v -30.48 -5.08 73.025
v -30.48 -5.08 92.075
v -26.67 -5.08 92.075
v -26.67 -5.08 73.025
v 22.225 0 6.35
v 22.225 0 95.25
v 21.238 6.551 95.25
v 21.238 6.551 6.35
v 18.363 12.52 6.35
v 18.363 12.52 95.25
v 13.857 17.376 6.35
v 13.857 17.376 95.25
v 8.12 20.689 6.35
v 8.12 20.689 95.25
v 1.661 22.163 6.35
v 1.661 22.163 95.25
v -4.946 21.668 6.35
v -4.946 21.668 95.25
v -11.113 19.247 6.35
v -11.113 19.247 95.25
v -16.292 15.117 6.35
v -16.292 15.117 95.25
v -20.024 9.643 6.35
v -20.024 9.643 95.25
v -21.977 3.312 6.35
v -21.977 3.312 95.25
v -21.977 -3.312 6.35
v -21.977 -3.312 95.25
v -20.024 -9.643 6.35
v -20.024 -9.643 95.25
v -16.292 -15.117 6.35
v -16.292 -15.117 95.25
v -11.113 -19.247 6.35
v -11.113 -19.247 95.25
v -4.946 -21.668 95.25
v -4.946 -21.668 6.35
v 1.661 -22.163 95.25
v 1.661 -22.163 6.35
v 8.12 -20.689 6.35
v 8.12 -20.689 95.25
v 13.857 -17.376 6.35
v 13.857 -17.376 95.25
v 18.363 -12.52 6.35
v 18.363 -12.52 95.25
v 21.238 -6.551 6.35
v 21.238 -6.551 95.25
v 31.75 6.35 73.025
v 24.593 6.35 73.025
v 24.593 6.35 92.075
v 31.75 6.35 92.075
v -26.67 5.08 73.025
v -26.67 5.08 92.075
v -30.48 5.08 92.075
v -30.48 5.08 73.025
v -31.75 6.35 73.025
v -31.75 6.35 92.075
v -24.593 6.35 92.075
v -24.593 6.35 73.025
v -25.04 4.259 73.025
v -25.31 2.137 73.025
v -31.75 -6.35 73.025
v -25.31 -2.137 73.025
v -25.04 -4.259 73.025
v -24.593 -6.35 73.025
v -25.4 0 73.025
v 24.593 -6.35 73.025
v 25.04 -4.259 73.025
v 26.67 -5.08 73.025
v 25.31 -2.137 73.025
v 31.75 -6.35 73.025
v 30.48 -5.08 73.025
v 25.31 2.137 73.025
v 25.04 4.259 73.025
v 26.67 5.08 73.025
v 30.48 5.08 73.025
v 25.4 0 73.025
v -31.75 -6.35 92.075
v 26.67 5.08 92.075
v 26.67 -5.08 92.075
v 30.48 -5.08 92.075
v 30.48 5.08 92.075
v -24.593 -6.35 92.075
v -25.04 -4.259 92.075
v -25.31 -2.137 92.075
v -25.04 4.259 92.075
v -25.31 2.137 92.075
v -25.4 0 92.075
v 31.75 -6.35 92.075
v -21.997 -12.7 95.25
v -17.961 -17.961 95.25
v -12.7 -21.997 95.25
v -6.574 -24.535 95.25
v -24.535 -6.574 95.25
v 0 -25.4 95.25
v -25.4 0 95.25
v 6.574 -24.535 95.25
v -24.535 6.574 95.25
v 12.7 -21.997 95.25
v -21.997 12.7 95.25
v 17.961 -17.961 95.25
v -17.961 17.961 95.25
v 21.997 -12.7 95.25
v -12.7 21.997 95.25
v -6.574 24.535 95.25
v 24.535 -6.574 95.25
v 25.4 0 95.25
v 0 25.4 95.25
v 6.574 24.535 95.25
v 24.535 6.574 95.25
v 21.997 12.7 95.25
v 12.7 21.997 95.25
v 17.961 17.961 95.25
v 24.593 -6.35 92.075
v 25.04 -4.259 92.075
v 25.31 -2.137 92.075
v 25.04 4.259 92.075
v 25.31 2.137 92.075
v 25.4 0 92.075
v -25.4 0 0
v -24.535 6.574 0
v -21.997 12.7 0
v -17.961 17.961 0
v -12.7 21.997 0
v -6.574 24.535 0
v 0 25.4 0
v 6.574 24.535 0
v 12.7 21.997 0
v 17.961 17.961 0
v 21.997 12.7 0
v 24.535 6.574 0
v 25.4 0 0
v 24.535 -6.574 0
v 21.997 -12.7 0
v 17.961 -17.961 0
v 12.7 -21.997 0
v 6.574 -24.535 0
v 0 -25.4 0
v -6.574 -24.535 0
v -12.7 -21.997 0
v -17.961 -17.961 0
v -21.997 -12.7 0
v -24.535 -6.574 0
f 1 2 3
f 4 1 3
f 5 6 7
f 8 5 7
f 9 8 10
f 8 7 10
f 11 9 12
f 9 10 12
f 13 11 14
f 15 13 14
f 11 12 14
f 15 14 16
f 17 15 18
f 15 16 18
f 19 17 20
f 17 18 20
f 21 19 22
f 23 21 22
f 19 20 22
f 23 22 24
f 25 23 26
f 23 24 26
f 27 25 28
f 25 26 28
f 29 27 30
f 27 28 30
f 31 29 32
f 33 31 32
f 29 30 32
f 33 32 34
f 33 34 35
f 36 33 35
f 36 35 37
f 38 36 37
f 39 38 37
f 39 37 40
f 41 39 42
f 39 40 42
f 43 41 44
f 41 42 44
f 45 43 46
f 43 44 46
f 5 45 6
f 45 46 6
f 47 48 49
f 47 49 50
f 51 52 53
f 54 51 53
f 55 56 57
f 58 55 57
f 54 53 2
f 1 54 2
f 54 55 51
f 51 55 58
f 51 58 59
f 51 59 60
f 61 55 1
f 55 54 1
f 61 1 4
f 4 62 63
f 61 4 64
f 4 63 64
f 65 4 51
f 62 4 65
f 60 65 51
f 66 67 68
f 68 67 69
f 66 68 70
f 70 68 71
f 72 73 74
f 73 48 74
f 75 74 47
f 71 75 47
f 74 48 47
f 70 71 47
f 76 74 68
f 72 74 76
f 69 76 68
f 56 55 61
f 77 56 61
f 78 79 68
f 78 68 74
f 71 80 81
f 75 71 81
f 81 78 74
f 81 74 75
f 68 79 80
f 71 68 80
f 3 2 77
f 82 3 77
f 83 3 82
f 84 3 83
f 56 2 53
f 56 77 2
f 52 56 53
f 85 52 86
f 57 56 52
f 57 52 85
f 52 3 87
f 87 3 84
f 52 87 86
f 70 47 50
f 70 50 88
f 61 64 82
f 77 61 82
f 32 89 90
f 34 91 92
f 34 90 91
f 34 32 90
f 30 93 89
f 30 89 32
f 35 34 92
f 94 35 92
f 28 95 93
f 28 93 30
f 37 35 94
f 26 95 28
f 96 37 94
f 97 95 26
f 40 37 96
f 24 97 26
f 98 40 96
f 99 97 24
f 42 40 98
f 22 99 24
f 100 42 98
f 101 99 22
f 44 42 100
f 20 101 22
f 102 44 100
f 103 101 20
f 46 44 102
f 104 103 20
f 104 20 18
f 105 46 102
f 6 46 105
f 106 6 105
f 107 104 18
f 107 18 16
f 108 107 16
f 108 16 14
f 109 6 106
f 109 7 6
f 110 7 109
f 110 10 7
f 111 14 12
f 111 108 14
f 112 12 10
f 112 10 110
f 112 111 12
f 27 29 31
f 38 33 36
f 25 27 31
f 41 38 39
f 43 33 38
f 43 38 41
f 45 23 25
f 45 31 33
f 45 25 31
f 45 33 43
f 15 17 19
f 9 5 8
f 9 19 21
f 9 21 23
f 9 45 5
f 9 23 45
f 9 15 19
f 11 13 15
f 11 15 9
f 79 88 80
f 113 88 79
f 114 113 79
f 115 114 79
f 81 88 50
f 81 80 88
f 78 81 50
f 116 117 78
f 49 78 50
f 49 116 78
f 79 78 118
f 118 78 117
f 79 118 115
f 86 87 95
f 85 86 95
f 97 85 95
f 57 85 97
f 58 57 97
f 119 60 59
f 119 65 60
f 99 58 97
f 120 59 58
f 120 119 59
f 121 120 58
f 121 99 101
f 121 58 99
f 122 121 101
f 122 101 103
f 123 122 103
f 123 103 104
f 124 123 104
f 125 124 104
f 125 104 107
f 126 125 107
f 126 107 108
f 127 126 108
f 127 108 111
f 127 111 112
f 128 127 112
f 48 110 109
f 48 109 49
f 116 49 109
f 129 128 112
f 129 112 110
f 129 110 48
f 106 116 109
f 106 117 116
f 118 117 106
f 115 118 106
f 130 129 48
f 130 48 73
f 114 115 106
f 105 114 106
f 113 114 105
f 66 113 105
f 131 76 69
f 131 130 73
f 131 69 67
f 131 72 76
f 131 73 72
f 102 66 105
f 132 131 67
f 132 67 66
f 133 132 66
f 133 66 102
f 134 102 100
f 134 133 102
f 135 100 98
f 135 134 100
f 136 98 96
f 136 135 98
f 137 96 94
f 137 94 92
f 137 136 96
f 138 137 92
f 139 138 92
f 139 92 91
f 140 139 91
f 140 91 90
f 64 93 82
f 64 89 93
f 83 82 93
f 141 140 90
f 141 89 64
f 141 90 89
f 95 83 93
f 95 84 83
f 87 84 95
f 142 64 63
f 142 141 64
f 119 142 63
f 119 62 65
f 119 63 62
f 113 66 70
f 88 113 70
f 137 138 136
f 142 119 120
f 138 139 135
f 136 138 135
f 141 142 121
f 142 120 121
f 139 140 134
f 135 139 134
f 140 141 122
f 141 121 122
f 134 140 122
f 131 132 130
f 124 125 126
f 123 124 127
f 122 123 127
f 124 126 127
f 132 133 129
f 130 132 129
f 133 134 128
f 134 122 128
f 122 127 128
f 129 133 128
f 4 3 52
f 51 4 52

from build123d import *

# Parameters (mm, degrees)
F0_W          = 50.8
F0_H          = 50.8
F1_DEPTH      = 95.25
F3_DEPTH      = 6.35
F5_W          = 3.81
F5_H          = 10.16
F6_DEPTH      = 25.4
F7_T4_DEPTH   = 222.25
F7_T10_DEPTH  = 222.25
F7_T16_DEPTH  = 222.25
F7_T23_DEPTH  = 222.25
F7_T29_DEPTH  = 222.25
F7_T35_DEPTH  = 222.25
F7_T41_DEPTH  = 222.25
F7_T47_DEPTH  = 222.25
F7_T54_DEPTH  = 222.25
F7_T60_DEPTH  = 222.25
F7_T66_DEPTH  = 222.25
F7_T72_DEPTH  = 222.25
F7_T78_DEPTH  = 222.25
F7_T85_DEPTH  = 222.25
F7_T91_DEPTH  = 222.25
F7_T97_DEPTH  = 222.25
F7_T103_DEPTH = 222.25
F7_T109_DEPTH = 222.25
F7_T116_DEPTH = 222.25
F7_T122_DEPTH = 222.25
F8_R          = 22.225
F9_DEPTH      = 88.9


# Not quite as in the source:
# - a fillet or chamfer that OpenCascade refuses, or shapes differently, is made with other operations: its cross-section is extruded or revolved along the edge and cut away or added


with BuildPart() as f1:
    # F0 (on Top) → F1 (new body)
    with BuildSketch(Plane.XY):
        Rectangle(F0_W, F0_H)
    extrude(amount=F1_DEPTH)

    # F2 (on face) → F3 (join)
    with BuildSketch(Plane(origin=(-25.4, 0, 0), x_dir=(0, -1, 0), z_dir=(-1, 0, 0))):
        Polygon((-6.35, 73.025), (6.35, 73.025), (6.35, 92.075), (0, 92.075), (-6.35, 92.075), align=None)
    extrude(amount=F3_DEPTH)

    # F4: F1 across plane


with BuildPart() as f1_1:
    add(f1.part)
    add(f1.part.mirror(Plane.YZ))

    # F5 (on face) → F6 (cut)
    with BuildSketch(Plane.XY.offset(95.25)):
        Polygon((-26.67, -5.08), (-26.67, 0), (-28.575, 0), (-30.48, 0), (-30.48, -5.08), align=None)
        Polygon((-28.575, 0), (-26.67, 0), (-26.67, 5.08), (-30.48, 5.08), (-30.48, 0), align=None)
        with Locations((28.575, 0)):
            Rectangle(F5_W, F5_H)
    extrude(amount=-F6_DEPTH, mode=Mode.SUBTRACT)

    # F7: fillet of radius 25.4 on 4 edges, made by hand


with BuildPart() as f7_tool2:
    # F7_s3 → F7_t4 (new body)
    with BuildSketch(Plane.XY.offset(-63.5)):
        with BuildLine():
            ThreePointArc((0, -25.4), (-17.9605122421, -17.9605122421), (-25.4, 0))
            Line((-25.4, 0), (-25.4, -25.4))
            Line((-25.4, -25.4), (0, -25.4))
        make_face()
    extrude(amount=F7_T4_DEPTH)

    split(bisect_by=Plane.XZ.offset(6.35), keep=Keep.TOP)

    split(bisect_by=Plane.XY.offset(73.025), keep=Keep.BOTTOM)


with BuildPart() as f1_2:
    add(f1_1.part)

    # F7_t1: cut F7_tool2
    add(f7_tool2.part, mode=Mode.SUBTRACT)


with BuildPart() as f7_tool8:
    # F7_s9 → F7_t10 (new body)
    with BuildSketch(Plane.XY.offset(-63.5)):
        with BuildLine():
            ThreePointArc((0, -25.4), (-17.9605122421, -17.9605122421), (-25.4, 0))
            Line((-25.4, 0), (-25.4, -25.4))
            Line((-25.4, -25.4), (0, -25.4))
        make_face()
    extrude(amount=F7_T10_DEPTH)

    split(bisect_by=Plane.XZ.offset(6.35), keep=Keep.BOTTOM)

    split(bisect_by=Plane.XY.offset(73.025), keep=Keep.BOTTOM)


with BuildPart() as f1_3:
    add(f1_2.part)

    # F7_t7: cut F7_tool8
    add(f7_tool8.part, mode=Mode.SUBTRACT)


with BuildPart() as f7_tool14:
    # F7_s15 → F7_t16 (new body)
    with BuildSketch(Plane.XY.offset(-63.5)):
        with BuildLine():
            ThreePointArc((0, -25.4), (-17.9605122421, -17.9605122421), (-25.4, 0))
            Line((-25.4, 0), (-25.4, -25.4))
            Line((-25.4, -25.4), (0, -25.4))
        make_face()
    extrude(amount=F7_T16_DEPTH)

    split(bisect_by=Plane.XY.offset(92.075), keep=Keep.BOTTOM)

    split(bisect_by=Plane.XZ.offset(6.35), keep=Keep.TOP)

    split(bisect_by=Plane.XY.offset(73.025), keep=Keep.TOP)


with BuildPart() as f1_4:
    add(f1_3.part)

    # F7_t13: cut F7_tool14
    add(f7_tool14.part, mode=Mode.SUBTRACT)


with BuildPart() as f7_tool21:
    # F7_s22 → F7_t23 (new body)
    with BuildSketch(Plane.XY.offset(-63.5)):
        with BuildLine():
            ThreePointArc((0, -25.4), (-17.9605122421, -17.9605122421), (-25.4, 0))
            Line((-25.4, 0), (-25.4, -25.4))
            Line((-25.4, -25.4), (0, -25.4))
        make_face()
    extrude(amount=F7_T23_DEPTH)

    split(bisect_by=Plane.XY.offset(92.075), keep=Keep.TOP)

    split(bisect_by=Plane.XZ.offset(6.35), keep=Keep.TOP)


with BuildPart() as f1_5:
    add(f1_4.part)

    # F7_t20: cut F7_tool21
    add(f7_tool21.part, mode=Mode.SUBTRACT)


with BuildPart() as f7_tool27:
    # F7_s28 → F7_t29 (new body)
    with BuildSketch(Plane.XY.offset(-63.5)):
        with BuildLine():
            ThreePointArc((0, -25.4), (-17.9605122421, -17.9605122421), (-25.4, 0))
            Line((-25.4, 0), (-25.4, -25.4))
            Line((-25.4, -25.4), (0, -25.4))
        make_face()
    extrude(amount=F7_T29_DEPTH)

    split(bisect_by=Plane.XY.offset(92.075), keep=Keep.TOP)

    split(bisect_by=Plane.XZ.offset(6.35), keep=Keep.BOTTOM)


with BuildPart() as f1_6:
    add(f1_5.part)

    # F7_t26: cut F7_tool27
    add(f7_tool27.part, mode=Mode.SUBTRACT)


with BuildPart() as f7_tool33:
    # F7_s34 → F7_t35 (new body)
    with BuildSketch(Plane.XY.offset(-63.5)):
        with BuildLine():
            ThreePointArc((0, -25.4), (17.9605122421, -17.9605122421), (25.4, 0))
            Line((25.4, 0), (25.4, -25.4))
            Line((25.4, -25.4), (0, -25.4))
        make_face()
    extrude(amount=F7_T35_DEPTH)

    split(bisect_by=Plane.XY.offset(73.025), keep=Keep.BOTTOM)

    split(bisect_by=Plane.XZ.offset(6.35), keep=Keep.TOP)


with BuildPart() as f1_7:
    add(f1_6.part)

    # F7_t32: cut F7_tool33
    add(f7_tool33.part, mode=Mode.SUBTRACT)


with BuildPart() as f7_tool39:
    # F7_s40 → F7_t41 (new body)
    with BuildSketch(Plane.XY.offset(-63.5)):
        with BuildLine():
            ThreePointArc((0, -25.4), (17.9605122421, -17.9605122421), (25.4, 0))
            Line((25.4, 0), (25.4, -25.4))
            Line((25.4, -25.4), (0, -25.4))
        make_face()
    extrude(amount=F7_T41_DEPTH)

    split(bisect_by=Plane.XY.offset(73.025), keep=Keep.BOTTOM)

    split(bisect_by=Plane.XZ.offset(6.35), keep=Keep.BOTTOM)


with BuildPart() as f1_8:
    add(f1_7.part)

    # F7_t38: cut F7_tool39
    add(f7_tool39.part, mode=Mode.SUBTRACT)


with BuildPart() as f7_tool45:
    # F7_s46 → F7_t47 (new body)
    with BuildSketch(Plane.XY.offset(-63.5)):
        with BuildLine():
            ThreePointArc((0, -25.4), (17.9605122421, -17.9605122421), (25.4, 0))
            Line((25.4, 0), (25.4, -25.4))
            Line((25.4, -25.4), (0, -25.4))
        make_face()
    extrude(amount=F7_T47_DEPTH)

    split(bisect_by=Plane.XY.offset(73.025), keep=Keep.TOP)

    split(bisect_by=Plane.XZ.offset(6.35), keep=Keep.TOP)

    split(bisect_by=Plane.XY.offset(92.075), keep=Keep.BOTTOM)


with BuildPart() as f1_9:
    add(f1_8.part)

    # F7_t44: cut F7_tool45
    add(f7_tool45.part, mode=Mode.SUBTRACT)


with BuildPart() as f7_tool52:
    # F7_s53 → F7_t54 (new body)
    with BuildSketch(Plane.XY.offset(-63.5)):
        with BuildLine():
            ThreePointArc((0, -25.4), (17.9605122421, -17.9605122421), (25.4, 0))
            Line((25.4, 0), (25.4, -25.4))
            Line((25.4, -25.4), (0, -25.4))
        make_face()
    extrude(amount=F7_T54_DEPTH)

    split(bisect_by=Plane.XZ.offset(6.35), keep=Keep.TOP)

    split(bisect_by=Plane.XY.offset(92.075), keep=Keep.TOP)


with BuildPart() as f1_10:
    add(f1_9.part)

    # F7_t51: cut F7_tool52
    add(f7_tool52.part, mode=Mode.SUBTRACT)


with BuildPart() as f7_tool58:
    # F7_s59 → F7_t60 (new body)
    with BuildSketch(Plane.XY.offset(-63.5)):
        with BuildLine():
            ThreePointArc((0, -25.4), (17.9605122421, -17.9605122421), (25.4, 0))
            Line((25.4, 0), (25.4, -25.4))
            Line((25.4, -25.4), (0, -25.4))
        make_face()
    extrude(amount=F7_T60_DEPTH)

    split(bisect_by=Plane.XZ.offset(6.35), keep=Keep.BOTTOM)

    split(bisect_by=Plane.XY.offset(92.075), keep=Keep.TOP)


with BuildPart() as f1_11:
    add(f1_10.part)

    # F7_t57: cut F7_tool58
    add(f7_tool58.part, mode=Mode.SUBTRACT)


with BuildPart() as f7_tool64:
    # F7_s65 → F7_t66 (new body)
    with BuildSketch(Plane.XY.offset(-63.5)):
        with BuildLine():
            ThreePointArc((25.4, 0), (17.9605122421, 17.9605122421), (0, 25.4))
            Line((0, 25.4), (25.4, 25.4))
            Line((25.4, 25.4), (25.4, 0))
        make_face()
    extrude(amount=F7_T66_DEPTH)

    split(bisect_by=Plane.XZ.offset(-6.35), keep=Keep.TOP)

    split(bisect_by=Plane.XY.offset(73.025), keep=Keep.BOTTOM)


with BuildPart() as f1_12:
    add(f1_11.part)

    # F7_t63: cut F7_tool64
    add(f7_tool64.part, mode=Mode.SUBTRACT)


with BuildPart() as f7_tool70:
    # F7_s71 → F7_t72 (new body)
    with BuildSketch(Plane.XY.offset(-63.5)):
        with BuildLine():
            ThreePointArc((25.4, 0), (17.9605122421, 17.9605122421), (0, 25.4))
            Line((0, 25.4), (25.4, 25.4))
            Line((25.4, 25.4), (25.4, 0))
        make_face()
    extrude(amount=F7_T72_DEPTH)

    split(bisect_by=Plane.XZ.offset(-6.35), keep=Keep.BOTTOM)

    split(bisect_by=Plane.XY.offset(73.025), keep=Keep.BOTTOM)


with BuildPart() as f1_13:
    add(f1_12.part)

    # F7_t69: cut F7_tool70
    add(f7_tool70.part, mode=Mode.SUBTRACT)


with BuildPart() as f7_tool76:
    # F7_s77 → F7_t78 (new body)
    with BuildSketch(Plane.XY.offset(-63.5)):
        with BuildLine():
            ThreePointArc((25.4, 0), (17.9605122421, 17.9605122421), (0, 25.4))
            Line((0, 25.4), (25.4, 25.4))
            Line((25.4, 25.4), (25.4, 0))
        make_face()
    extrude(amount=F7_T78_DEPTH)

    split(bisect_by=Plane.XZ.offset(-6.35), keep=Keep.BOTTOM)

    split(bisect_by=Plane.XY.offset(73.025), keep=Keep.TOP)

    split(bisect_by=Plane.XY.offset(92.075), keep=Keep.BOTTOM)


with BuildPart() as f1_14:
    add(f1_13.part)

    # F7_t75: cut F7_tool76
    add(f7_tool76.part, mode=Mode.SUBTRACT)


with BuildPart() as f7_tool83:
    # F7_s84 → F7_t85 (new body)
    with BuildSketch(Plane.XY.offset(-63.5)):
        with BuildLine():
            ThreePointArc((25.4, 0), (17.9605122421, 17.9605122421), (0, 25.4))
            Line((0, 25.4), (25.4, 25.4))
            Line((25.4, 25.4), (25.4, 0))
        make_face()
    extrude(amount=F7_T85_DEPTH)

    split(bisect_by=Plane.XZ.offset(-6.35), keep=Keep.TOP)

    split(bisect_by=Plane.XY.offset(92.075), keep=Keep.TOP)


with BuildPart() as f1_15:
    add(f1_14.part)

    # F7_t82: cut F7_tool83
    add(f7_tool83.part, mode=Mode.SUBTRACT)


with BuildPart() as f7_tool89:
    # F7_s90 → F7_t91 (new body)
    with BuildSketch(Plane.XY.offset(-63.5)):
        with BuildLine():
            ThreePointArc((25.4, 0), (17.9605122421, 17.9605122421), (0, 25.4))
            Line((0, 25.4), (25.4, 25.4))
            Line((25.4, 25.4), (25.4, 0))
        make_face()
    extrude(amount=F7_T91_DEPTH)

    split(bisect_by=Plane.XZ.offset(-6.35), keep=Keep.BOTTOM)

    split(bisect_by=Plane.XY.offset(92.075), keep=Keep.TOP)


with BuildPart() as f1_16:
    add(f1_15.part)

    # F7_t88: cut F7_tool89
    add(f7_tool89.part, mode=Mode.SUBTRACT)


with BuildPart() as f7_tool95:
    # F7_s96 → F7_t97 (new body)
    with BuildSketch(Plane.XY.offset(-63.5)):
        with BuildLine():
            ThreePointArc((-25.4, 0), (-17.9605122421, 17.9605122421), (0, 25.4))
            Line((0, 25.4), (-25.4, 25.4))
            Line((-25.4, 25.4), (-25.4, 0))
        make_face()
    extrude(amount=F7_T97_DEPTH)

    split(bisect_by=Plane.XZ.offset(-6.35), keep=Keep.TOP)

    split(bisect_by=Plane.XY.offset(73.025), keep=Keep.BOTTOM)


with BuildPart() as f1_17:
    add(f1_16.part)

    # F7_t94: cut F7_tool95
    add(f7_tool95.part, mode=Mode.SUBTRACT)


with BuildPart() as f7_tool101:
    # F7_s102 → F7_t103 (new body)
    with BuildSketch(Plane.XY.offset(-63.5)):
        with BuildLine():
            ThreePointArc((-25.4, 0), (-17.9605122421, 17.9605122421), (0, 25.4))
            Line((0, 25.4), (-25.4, 25.4))
            Line((-25.4, 25.4), (-25.4, 0))
        make_face()
    extrude(amount=F7_T103_DEPTH)

    split(bisect_by=Plane.XZ.offset(-6.35), keep=Keep.BOTTOM)

    split(bisect_by=Plane.XY.offset(73.025), keep=Keep.BOTTOM)


with BuildPart() as f1_18:
    add(f1_17.part)

    # F7_t100: cut F7_tool101
    add(f7_tool101.part, mode=Mode.SUBTRACT)


with BuildPart() as f7_tool107:
    # F7_s108 → F7_t109 (new body)
    with BuildSketch(Plane.XY.offset(-63.5)):
        with BuildLine():
            ThreePointArc((-25.4, 0), (-17.9605122421, 17.9605122421), (0, 25.4))
            Line((0, 25.4), (-25.4, 25.4))
            Line((-25.4, 25.4), (-25.4, 0))
        make_face()
    extrude(amount=F7_T109_DEPTH)

    split(bisect_by=Plane.XZ.offset(-6.35), keep=Keep.BOTTOM)

    split(bisect_by=Plane.XY.offset(92.075), keep=Keep.BOTTOM)

    split(bisect_by=Plane.XY.offset(73.025), keep=Keep.TOP)


with BuildPart() as f1_19:
    add(f1_18.part)

    # F7_t106: cut F7_tool107
    add(f7_tool107.part, mode=Mode.SUBTRACT)


with BuildPart() as f7_tool114:
    # F7_s115 → F7_t116 (new body)
    with BuildSketch(Plane.XY.offset(-63.5)):
        with BuildLine():
            ThreePointArc((-25.4, 0), (-17.9605122421, 17.9605122421), (0, 25.4))
            Line((0, 25.4), (-25.4, 25.4))
            Line((-25.4, 25.4), (-25.4, 0))
        make_face()
    extrude(amount=F7_T116_DEPTH)

    split(bisect_by=Plane.XZ.offset(-6.35), keep=Keep.TOP)

    split(bisect_by=Plane.XY.offset(92.075), keep=Keep.TOP)


with BuildPart() as f1_20:
    add(f1_19.part)

    # F7_t113: cut F7_tool114
    add(f7_tool114.part, mode=Mode.SUBTRACT)


with BuildPart() as f7_tool120:
    # F7_s121 → F7_t122 (new body)
    with BuildSketch(Plane.XY.offset(-63.5)):
        with BuildLine():
            ThreePointArc((-25.4, 0), (-17.9605122421, 17.9605122421), (0, 25.4))
            Line((0, 25.4), (-25.4, 25.4))
            Line((-25.4, 25.4), (-25.4, 0))
        make_face()
    extrude(amount=F7_T122_DEPTH)

    split(bisect_by=Plane.XZ.offset(-6.35), keep=Keep.BOTTOM)

    split(bisect_by=Plane.XY.offset(92.075), keep=Keep.TOP)


with BuildPart() as f1_21:
    add(f1_20.part)

    # F7_t119: cut F7_tool120
    add(f7_tool120.part, mode=Mode.SUBTRACT)

    # F8 (on face) → F9 (cut)
    with BuildSketch(Plane.XY.offset(95.25)):
        Circle(F8_R)
    extrude(amount=-F9_DEPTH, mode=Mode.SUBTRACT)


solid = f1_21.part
